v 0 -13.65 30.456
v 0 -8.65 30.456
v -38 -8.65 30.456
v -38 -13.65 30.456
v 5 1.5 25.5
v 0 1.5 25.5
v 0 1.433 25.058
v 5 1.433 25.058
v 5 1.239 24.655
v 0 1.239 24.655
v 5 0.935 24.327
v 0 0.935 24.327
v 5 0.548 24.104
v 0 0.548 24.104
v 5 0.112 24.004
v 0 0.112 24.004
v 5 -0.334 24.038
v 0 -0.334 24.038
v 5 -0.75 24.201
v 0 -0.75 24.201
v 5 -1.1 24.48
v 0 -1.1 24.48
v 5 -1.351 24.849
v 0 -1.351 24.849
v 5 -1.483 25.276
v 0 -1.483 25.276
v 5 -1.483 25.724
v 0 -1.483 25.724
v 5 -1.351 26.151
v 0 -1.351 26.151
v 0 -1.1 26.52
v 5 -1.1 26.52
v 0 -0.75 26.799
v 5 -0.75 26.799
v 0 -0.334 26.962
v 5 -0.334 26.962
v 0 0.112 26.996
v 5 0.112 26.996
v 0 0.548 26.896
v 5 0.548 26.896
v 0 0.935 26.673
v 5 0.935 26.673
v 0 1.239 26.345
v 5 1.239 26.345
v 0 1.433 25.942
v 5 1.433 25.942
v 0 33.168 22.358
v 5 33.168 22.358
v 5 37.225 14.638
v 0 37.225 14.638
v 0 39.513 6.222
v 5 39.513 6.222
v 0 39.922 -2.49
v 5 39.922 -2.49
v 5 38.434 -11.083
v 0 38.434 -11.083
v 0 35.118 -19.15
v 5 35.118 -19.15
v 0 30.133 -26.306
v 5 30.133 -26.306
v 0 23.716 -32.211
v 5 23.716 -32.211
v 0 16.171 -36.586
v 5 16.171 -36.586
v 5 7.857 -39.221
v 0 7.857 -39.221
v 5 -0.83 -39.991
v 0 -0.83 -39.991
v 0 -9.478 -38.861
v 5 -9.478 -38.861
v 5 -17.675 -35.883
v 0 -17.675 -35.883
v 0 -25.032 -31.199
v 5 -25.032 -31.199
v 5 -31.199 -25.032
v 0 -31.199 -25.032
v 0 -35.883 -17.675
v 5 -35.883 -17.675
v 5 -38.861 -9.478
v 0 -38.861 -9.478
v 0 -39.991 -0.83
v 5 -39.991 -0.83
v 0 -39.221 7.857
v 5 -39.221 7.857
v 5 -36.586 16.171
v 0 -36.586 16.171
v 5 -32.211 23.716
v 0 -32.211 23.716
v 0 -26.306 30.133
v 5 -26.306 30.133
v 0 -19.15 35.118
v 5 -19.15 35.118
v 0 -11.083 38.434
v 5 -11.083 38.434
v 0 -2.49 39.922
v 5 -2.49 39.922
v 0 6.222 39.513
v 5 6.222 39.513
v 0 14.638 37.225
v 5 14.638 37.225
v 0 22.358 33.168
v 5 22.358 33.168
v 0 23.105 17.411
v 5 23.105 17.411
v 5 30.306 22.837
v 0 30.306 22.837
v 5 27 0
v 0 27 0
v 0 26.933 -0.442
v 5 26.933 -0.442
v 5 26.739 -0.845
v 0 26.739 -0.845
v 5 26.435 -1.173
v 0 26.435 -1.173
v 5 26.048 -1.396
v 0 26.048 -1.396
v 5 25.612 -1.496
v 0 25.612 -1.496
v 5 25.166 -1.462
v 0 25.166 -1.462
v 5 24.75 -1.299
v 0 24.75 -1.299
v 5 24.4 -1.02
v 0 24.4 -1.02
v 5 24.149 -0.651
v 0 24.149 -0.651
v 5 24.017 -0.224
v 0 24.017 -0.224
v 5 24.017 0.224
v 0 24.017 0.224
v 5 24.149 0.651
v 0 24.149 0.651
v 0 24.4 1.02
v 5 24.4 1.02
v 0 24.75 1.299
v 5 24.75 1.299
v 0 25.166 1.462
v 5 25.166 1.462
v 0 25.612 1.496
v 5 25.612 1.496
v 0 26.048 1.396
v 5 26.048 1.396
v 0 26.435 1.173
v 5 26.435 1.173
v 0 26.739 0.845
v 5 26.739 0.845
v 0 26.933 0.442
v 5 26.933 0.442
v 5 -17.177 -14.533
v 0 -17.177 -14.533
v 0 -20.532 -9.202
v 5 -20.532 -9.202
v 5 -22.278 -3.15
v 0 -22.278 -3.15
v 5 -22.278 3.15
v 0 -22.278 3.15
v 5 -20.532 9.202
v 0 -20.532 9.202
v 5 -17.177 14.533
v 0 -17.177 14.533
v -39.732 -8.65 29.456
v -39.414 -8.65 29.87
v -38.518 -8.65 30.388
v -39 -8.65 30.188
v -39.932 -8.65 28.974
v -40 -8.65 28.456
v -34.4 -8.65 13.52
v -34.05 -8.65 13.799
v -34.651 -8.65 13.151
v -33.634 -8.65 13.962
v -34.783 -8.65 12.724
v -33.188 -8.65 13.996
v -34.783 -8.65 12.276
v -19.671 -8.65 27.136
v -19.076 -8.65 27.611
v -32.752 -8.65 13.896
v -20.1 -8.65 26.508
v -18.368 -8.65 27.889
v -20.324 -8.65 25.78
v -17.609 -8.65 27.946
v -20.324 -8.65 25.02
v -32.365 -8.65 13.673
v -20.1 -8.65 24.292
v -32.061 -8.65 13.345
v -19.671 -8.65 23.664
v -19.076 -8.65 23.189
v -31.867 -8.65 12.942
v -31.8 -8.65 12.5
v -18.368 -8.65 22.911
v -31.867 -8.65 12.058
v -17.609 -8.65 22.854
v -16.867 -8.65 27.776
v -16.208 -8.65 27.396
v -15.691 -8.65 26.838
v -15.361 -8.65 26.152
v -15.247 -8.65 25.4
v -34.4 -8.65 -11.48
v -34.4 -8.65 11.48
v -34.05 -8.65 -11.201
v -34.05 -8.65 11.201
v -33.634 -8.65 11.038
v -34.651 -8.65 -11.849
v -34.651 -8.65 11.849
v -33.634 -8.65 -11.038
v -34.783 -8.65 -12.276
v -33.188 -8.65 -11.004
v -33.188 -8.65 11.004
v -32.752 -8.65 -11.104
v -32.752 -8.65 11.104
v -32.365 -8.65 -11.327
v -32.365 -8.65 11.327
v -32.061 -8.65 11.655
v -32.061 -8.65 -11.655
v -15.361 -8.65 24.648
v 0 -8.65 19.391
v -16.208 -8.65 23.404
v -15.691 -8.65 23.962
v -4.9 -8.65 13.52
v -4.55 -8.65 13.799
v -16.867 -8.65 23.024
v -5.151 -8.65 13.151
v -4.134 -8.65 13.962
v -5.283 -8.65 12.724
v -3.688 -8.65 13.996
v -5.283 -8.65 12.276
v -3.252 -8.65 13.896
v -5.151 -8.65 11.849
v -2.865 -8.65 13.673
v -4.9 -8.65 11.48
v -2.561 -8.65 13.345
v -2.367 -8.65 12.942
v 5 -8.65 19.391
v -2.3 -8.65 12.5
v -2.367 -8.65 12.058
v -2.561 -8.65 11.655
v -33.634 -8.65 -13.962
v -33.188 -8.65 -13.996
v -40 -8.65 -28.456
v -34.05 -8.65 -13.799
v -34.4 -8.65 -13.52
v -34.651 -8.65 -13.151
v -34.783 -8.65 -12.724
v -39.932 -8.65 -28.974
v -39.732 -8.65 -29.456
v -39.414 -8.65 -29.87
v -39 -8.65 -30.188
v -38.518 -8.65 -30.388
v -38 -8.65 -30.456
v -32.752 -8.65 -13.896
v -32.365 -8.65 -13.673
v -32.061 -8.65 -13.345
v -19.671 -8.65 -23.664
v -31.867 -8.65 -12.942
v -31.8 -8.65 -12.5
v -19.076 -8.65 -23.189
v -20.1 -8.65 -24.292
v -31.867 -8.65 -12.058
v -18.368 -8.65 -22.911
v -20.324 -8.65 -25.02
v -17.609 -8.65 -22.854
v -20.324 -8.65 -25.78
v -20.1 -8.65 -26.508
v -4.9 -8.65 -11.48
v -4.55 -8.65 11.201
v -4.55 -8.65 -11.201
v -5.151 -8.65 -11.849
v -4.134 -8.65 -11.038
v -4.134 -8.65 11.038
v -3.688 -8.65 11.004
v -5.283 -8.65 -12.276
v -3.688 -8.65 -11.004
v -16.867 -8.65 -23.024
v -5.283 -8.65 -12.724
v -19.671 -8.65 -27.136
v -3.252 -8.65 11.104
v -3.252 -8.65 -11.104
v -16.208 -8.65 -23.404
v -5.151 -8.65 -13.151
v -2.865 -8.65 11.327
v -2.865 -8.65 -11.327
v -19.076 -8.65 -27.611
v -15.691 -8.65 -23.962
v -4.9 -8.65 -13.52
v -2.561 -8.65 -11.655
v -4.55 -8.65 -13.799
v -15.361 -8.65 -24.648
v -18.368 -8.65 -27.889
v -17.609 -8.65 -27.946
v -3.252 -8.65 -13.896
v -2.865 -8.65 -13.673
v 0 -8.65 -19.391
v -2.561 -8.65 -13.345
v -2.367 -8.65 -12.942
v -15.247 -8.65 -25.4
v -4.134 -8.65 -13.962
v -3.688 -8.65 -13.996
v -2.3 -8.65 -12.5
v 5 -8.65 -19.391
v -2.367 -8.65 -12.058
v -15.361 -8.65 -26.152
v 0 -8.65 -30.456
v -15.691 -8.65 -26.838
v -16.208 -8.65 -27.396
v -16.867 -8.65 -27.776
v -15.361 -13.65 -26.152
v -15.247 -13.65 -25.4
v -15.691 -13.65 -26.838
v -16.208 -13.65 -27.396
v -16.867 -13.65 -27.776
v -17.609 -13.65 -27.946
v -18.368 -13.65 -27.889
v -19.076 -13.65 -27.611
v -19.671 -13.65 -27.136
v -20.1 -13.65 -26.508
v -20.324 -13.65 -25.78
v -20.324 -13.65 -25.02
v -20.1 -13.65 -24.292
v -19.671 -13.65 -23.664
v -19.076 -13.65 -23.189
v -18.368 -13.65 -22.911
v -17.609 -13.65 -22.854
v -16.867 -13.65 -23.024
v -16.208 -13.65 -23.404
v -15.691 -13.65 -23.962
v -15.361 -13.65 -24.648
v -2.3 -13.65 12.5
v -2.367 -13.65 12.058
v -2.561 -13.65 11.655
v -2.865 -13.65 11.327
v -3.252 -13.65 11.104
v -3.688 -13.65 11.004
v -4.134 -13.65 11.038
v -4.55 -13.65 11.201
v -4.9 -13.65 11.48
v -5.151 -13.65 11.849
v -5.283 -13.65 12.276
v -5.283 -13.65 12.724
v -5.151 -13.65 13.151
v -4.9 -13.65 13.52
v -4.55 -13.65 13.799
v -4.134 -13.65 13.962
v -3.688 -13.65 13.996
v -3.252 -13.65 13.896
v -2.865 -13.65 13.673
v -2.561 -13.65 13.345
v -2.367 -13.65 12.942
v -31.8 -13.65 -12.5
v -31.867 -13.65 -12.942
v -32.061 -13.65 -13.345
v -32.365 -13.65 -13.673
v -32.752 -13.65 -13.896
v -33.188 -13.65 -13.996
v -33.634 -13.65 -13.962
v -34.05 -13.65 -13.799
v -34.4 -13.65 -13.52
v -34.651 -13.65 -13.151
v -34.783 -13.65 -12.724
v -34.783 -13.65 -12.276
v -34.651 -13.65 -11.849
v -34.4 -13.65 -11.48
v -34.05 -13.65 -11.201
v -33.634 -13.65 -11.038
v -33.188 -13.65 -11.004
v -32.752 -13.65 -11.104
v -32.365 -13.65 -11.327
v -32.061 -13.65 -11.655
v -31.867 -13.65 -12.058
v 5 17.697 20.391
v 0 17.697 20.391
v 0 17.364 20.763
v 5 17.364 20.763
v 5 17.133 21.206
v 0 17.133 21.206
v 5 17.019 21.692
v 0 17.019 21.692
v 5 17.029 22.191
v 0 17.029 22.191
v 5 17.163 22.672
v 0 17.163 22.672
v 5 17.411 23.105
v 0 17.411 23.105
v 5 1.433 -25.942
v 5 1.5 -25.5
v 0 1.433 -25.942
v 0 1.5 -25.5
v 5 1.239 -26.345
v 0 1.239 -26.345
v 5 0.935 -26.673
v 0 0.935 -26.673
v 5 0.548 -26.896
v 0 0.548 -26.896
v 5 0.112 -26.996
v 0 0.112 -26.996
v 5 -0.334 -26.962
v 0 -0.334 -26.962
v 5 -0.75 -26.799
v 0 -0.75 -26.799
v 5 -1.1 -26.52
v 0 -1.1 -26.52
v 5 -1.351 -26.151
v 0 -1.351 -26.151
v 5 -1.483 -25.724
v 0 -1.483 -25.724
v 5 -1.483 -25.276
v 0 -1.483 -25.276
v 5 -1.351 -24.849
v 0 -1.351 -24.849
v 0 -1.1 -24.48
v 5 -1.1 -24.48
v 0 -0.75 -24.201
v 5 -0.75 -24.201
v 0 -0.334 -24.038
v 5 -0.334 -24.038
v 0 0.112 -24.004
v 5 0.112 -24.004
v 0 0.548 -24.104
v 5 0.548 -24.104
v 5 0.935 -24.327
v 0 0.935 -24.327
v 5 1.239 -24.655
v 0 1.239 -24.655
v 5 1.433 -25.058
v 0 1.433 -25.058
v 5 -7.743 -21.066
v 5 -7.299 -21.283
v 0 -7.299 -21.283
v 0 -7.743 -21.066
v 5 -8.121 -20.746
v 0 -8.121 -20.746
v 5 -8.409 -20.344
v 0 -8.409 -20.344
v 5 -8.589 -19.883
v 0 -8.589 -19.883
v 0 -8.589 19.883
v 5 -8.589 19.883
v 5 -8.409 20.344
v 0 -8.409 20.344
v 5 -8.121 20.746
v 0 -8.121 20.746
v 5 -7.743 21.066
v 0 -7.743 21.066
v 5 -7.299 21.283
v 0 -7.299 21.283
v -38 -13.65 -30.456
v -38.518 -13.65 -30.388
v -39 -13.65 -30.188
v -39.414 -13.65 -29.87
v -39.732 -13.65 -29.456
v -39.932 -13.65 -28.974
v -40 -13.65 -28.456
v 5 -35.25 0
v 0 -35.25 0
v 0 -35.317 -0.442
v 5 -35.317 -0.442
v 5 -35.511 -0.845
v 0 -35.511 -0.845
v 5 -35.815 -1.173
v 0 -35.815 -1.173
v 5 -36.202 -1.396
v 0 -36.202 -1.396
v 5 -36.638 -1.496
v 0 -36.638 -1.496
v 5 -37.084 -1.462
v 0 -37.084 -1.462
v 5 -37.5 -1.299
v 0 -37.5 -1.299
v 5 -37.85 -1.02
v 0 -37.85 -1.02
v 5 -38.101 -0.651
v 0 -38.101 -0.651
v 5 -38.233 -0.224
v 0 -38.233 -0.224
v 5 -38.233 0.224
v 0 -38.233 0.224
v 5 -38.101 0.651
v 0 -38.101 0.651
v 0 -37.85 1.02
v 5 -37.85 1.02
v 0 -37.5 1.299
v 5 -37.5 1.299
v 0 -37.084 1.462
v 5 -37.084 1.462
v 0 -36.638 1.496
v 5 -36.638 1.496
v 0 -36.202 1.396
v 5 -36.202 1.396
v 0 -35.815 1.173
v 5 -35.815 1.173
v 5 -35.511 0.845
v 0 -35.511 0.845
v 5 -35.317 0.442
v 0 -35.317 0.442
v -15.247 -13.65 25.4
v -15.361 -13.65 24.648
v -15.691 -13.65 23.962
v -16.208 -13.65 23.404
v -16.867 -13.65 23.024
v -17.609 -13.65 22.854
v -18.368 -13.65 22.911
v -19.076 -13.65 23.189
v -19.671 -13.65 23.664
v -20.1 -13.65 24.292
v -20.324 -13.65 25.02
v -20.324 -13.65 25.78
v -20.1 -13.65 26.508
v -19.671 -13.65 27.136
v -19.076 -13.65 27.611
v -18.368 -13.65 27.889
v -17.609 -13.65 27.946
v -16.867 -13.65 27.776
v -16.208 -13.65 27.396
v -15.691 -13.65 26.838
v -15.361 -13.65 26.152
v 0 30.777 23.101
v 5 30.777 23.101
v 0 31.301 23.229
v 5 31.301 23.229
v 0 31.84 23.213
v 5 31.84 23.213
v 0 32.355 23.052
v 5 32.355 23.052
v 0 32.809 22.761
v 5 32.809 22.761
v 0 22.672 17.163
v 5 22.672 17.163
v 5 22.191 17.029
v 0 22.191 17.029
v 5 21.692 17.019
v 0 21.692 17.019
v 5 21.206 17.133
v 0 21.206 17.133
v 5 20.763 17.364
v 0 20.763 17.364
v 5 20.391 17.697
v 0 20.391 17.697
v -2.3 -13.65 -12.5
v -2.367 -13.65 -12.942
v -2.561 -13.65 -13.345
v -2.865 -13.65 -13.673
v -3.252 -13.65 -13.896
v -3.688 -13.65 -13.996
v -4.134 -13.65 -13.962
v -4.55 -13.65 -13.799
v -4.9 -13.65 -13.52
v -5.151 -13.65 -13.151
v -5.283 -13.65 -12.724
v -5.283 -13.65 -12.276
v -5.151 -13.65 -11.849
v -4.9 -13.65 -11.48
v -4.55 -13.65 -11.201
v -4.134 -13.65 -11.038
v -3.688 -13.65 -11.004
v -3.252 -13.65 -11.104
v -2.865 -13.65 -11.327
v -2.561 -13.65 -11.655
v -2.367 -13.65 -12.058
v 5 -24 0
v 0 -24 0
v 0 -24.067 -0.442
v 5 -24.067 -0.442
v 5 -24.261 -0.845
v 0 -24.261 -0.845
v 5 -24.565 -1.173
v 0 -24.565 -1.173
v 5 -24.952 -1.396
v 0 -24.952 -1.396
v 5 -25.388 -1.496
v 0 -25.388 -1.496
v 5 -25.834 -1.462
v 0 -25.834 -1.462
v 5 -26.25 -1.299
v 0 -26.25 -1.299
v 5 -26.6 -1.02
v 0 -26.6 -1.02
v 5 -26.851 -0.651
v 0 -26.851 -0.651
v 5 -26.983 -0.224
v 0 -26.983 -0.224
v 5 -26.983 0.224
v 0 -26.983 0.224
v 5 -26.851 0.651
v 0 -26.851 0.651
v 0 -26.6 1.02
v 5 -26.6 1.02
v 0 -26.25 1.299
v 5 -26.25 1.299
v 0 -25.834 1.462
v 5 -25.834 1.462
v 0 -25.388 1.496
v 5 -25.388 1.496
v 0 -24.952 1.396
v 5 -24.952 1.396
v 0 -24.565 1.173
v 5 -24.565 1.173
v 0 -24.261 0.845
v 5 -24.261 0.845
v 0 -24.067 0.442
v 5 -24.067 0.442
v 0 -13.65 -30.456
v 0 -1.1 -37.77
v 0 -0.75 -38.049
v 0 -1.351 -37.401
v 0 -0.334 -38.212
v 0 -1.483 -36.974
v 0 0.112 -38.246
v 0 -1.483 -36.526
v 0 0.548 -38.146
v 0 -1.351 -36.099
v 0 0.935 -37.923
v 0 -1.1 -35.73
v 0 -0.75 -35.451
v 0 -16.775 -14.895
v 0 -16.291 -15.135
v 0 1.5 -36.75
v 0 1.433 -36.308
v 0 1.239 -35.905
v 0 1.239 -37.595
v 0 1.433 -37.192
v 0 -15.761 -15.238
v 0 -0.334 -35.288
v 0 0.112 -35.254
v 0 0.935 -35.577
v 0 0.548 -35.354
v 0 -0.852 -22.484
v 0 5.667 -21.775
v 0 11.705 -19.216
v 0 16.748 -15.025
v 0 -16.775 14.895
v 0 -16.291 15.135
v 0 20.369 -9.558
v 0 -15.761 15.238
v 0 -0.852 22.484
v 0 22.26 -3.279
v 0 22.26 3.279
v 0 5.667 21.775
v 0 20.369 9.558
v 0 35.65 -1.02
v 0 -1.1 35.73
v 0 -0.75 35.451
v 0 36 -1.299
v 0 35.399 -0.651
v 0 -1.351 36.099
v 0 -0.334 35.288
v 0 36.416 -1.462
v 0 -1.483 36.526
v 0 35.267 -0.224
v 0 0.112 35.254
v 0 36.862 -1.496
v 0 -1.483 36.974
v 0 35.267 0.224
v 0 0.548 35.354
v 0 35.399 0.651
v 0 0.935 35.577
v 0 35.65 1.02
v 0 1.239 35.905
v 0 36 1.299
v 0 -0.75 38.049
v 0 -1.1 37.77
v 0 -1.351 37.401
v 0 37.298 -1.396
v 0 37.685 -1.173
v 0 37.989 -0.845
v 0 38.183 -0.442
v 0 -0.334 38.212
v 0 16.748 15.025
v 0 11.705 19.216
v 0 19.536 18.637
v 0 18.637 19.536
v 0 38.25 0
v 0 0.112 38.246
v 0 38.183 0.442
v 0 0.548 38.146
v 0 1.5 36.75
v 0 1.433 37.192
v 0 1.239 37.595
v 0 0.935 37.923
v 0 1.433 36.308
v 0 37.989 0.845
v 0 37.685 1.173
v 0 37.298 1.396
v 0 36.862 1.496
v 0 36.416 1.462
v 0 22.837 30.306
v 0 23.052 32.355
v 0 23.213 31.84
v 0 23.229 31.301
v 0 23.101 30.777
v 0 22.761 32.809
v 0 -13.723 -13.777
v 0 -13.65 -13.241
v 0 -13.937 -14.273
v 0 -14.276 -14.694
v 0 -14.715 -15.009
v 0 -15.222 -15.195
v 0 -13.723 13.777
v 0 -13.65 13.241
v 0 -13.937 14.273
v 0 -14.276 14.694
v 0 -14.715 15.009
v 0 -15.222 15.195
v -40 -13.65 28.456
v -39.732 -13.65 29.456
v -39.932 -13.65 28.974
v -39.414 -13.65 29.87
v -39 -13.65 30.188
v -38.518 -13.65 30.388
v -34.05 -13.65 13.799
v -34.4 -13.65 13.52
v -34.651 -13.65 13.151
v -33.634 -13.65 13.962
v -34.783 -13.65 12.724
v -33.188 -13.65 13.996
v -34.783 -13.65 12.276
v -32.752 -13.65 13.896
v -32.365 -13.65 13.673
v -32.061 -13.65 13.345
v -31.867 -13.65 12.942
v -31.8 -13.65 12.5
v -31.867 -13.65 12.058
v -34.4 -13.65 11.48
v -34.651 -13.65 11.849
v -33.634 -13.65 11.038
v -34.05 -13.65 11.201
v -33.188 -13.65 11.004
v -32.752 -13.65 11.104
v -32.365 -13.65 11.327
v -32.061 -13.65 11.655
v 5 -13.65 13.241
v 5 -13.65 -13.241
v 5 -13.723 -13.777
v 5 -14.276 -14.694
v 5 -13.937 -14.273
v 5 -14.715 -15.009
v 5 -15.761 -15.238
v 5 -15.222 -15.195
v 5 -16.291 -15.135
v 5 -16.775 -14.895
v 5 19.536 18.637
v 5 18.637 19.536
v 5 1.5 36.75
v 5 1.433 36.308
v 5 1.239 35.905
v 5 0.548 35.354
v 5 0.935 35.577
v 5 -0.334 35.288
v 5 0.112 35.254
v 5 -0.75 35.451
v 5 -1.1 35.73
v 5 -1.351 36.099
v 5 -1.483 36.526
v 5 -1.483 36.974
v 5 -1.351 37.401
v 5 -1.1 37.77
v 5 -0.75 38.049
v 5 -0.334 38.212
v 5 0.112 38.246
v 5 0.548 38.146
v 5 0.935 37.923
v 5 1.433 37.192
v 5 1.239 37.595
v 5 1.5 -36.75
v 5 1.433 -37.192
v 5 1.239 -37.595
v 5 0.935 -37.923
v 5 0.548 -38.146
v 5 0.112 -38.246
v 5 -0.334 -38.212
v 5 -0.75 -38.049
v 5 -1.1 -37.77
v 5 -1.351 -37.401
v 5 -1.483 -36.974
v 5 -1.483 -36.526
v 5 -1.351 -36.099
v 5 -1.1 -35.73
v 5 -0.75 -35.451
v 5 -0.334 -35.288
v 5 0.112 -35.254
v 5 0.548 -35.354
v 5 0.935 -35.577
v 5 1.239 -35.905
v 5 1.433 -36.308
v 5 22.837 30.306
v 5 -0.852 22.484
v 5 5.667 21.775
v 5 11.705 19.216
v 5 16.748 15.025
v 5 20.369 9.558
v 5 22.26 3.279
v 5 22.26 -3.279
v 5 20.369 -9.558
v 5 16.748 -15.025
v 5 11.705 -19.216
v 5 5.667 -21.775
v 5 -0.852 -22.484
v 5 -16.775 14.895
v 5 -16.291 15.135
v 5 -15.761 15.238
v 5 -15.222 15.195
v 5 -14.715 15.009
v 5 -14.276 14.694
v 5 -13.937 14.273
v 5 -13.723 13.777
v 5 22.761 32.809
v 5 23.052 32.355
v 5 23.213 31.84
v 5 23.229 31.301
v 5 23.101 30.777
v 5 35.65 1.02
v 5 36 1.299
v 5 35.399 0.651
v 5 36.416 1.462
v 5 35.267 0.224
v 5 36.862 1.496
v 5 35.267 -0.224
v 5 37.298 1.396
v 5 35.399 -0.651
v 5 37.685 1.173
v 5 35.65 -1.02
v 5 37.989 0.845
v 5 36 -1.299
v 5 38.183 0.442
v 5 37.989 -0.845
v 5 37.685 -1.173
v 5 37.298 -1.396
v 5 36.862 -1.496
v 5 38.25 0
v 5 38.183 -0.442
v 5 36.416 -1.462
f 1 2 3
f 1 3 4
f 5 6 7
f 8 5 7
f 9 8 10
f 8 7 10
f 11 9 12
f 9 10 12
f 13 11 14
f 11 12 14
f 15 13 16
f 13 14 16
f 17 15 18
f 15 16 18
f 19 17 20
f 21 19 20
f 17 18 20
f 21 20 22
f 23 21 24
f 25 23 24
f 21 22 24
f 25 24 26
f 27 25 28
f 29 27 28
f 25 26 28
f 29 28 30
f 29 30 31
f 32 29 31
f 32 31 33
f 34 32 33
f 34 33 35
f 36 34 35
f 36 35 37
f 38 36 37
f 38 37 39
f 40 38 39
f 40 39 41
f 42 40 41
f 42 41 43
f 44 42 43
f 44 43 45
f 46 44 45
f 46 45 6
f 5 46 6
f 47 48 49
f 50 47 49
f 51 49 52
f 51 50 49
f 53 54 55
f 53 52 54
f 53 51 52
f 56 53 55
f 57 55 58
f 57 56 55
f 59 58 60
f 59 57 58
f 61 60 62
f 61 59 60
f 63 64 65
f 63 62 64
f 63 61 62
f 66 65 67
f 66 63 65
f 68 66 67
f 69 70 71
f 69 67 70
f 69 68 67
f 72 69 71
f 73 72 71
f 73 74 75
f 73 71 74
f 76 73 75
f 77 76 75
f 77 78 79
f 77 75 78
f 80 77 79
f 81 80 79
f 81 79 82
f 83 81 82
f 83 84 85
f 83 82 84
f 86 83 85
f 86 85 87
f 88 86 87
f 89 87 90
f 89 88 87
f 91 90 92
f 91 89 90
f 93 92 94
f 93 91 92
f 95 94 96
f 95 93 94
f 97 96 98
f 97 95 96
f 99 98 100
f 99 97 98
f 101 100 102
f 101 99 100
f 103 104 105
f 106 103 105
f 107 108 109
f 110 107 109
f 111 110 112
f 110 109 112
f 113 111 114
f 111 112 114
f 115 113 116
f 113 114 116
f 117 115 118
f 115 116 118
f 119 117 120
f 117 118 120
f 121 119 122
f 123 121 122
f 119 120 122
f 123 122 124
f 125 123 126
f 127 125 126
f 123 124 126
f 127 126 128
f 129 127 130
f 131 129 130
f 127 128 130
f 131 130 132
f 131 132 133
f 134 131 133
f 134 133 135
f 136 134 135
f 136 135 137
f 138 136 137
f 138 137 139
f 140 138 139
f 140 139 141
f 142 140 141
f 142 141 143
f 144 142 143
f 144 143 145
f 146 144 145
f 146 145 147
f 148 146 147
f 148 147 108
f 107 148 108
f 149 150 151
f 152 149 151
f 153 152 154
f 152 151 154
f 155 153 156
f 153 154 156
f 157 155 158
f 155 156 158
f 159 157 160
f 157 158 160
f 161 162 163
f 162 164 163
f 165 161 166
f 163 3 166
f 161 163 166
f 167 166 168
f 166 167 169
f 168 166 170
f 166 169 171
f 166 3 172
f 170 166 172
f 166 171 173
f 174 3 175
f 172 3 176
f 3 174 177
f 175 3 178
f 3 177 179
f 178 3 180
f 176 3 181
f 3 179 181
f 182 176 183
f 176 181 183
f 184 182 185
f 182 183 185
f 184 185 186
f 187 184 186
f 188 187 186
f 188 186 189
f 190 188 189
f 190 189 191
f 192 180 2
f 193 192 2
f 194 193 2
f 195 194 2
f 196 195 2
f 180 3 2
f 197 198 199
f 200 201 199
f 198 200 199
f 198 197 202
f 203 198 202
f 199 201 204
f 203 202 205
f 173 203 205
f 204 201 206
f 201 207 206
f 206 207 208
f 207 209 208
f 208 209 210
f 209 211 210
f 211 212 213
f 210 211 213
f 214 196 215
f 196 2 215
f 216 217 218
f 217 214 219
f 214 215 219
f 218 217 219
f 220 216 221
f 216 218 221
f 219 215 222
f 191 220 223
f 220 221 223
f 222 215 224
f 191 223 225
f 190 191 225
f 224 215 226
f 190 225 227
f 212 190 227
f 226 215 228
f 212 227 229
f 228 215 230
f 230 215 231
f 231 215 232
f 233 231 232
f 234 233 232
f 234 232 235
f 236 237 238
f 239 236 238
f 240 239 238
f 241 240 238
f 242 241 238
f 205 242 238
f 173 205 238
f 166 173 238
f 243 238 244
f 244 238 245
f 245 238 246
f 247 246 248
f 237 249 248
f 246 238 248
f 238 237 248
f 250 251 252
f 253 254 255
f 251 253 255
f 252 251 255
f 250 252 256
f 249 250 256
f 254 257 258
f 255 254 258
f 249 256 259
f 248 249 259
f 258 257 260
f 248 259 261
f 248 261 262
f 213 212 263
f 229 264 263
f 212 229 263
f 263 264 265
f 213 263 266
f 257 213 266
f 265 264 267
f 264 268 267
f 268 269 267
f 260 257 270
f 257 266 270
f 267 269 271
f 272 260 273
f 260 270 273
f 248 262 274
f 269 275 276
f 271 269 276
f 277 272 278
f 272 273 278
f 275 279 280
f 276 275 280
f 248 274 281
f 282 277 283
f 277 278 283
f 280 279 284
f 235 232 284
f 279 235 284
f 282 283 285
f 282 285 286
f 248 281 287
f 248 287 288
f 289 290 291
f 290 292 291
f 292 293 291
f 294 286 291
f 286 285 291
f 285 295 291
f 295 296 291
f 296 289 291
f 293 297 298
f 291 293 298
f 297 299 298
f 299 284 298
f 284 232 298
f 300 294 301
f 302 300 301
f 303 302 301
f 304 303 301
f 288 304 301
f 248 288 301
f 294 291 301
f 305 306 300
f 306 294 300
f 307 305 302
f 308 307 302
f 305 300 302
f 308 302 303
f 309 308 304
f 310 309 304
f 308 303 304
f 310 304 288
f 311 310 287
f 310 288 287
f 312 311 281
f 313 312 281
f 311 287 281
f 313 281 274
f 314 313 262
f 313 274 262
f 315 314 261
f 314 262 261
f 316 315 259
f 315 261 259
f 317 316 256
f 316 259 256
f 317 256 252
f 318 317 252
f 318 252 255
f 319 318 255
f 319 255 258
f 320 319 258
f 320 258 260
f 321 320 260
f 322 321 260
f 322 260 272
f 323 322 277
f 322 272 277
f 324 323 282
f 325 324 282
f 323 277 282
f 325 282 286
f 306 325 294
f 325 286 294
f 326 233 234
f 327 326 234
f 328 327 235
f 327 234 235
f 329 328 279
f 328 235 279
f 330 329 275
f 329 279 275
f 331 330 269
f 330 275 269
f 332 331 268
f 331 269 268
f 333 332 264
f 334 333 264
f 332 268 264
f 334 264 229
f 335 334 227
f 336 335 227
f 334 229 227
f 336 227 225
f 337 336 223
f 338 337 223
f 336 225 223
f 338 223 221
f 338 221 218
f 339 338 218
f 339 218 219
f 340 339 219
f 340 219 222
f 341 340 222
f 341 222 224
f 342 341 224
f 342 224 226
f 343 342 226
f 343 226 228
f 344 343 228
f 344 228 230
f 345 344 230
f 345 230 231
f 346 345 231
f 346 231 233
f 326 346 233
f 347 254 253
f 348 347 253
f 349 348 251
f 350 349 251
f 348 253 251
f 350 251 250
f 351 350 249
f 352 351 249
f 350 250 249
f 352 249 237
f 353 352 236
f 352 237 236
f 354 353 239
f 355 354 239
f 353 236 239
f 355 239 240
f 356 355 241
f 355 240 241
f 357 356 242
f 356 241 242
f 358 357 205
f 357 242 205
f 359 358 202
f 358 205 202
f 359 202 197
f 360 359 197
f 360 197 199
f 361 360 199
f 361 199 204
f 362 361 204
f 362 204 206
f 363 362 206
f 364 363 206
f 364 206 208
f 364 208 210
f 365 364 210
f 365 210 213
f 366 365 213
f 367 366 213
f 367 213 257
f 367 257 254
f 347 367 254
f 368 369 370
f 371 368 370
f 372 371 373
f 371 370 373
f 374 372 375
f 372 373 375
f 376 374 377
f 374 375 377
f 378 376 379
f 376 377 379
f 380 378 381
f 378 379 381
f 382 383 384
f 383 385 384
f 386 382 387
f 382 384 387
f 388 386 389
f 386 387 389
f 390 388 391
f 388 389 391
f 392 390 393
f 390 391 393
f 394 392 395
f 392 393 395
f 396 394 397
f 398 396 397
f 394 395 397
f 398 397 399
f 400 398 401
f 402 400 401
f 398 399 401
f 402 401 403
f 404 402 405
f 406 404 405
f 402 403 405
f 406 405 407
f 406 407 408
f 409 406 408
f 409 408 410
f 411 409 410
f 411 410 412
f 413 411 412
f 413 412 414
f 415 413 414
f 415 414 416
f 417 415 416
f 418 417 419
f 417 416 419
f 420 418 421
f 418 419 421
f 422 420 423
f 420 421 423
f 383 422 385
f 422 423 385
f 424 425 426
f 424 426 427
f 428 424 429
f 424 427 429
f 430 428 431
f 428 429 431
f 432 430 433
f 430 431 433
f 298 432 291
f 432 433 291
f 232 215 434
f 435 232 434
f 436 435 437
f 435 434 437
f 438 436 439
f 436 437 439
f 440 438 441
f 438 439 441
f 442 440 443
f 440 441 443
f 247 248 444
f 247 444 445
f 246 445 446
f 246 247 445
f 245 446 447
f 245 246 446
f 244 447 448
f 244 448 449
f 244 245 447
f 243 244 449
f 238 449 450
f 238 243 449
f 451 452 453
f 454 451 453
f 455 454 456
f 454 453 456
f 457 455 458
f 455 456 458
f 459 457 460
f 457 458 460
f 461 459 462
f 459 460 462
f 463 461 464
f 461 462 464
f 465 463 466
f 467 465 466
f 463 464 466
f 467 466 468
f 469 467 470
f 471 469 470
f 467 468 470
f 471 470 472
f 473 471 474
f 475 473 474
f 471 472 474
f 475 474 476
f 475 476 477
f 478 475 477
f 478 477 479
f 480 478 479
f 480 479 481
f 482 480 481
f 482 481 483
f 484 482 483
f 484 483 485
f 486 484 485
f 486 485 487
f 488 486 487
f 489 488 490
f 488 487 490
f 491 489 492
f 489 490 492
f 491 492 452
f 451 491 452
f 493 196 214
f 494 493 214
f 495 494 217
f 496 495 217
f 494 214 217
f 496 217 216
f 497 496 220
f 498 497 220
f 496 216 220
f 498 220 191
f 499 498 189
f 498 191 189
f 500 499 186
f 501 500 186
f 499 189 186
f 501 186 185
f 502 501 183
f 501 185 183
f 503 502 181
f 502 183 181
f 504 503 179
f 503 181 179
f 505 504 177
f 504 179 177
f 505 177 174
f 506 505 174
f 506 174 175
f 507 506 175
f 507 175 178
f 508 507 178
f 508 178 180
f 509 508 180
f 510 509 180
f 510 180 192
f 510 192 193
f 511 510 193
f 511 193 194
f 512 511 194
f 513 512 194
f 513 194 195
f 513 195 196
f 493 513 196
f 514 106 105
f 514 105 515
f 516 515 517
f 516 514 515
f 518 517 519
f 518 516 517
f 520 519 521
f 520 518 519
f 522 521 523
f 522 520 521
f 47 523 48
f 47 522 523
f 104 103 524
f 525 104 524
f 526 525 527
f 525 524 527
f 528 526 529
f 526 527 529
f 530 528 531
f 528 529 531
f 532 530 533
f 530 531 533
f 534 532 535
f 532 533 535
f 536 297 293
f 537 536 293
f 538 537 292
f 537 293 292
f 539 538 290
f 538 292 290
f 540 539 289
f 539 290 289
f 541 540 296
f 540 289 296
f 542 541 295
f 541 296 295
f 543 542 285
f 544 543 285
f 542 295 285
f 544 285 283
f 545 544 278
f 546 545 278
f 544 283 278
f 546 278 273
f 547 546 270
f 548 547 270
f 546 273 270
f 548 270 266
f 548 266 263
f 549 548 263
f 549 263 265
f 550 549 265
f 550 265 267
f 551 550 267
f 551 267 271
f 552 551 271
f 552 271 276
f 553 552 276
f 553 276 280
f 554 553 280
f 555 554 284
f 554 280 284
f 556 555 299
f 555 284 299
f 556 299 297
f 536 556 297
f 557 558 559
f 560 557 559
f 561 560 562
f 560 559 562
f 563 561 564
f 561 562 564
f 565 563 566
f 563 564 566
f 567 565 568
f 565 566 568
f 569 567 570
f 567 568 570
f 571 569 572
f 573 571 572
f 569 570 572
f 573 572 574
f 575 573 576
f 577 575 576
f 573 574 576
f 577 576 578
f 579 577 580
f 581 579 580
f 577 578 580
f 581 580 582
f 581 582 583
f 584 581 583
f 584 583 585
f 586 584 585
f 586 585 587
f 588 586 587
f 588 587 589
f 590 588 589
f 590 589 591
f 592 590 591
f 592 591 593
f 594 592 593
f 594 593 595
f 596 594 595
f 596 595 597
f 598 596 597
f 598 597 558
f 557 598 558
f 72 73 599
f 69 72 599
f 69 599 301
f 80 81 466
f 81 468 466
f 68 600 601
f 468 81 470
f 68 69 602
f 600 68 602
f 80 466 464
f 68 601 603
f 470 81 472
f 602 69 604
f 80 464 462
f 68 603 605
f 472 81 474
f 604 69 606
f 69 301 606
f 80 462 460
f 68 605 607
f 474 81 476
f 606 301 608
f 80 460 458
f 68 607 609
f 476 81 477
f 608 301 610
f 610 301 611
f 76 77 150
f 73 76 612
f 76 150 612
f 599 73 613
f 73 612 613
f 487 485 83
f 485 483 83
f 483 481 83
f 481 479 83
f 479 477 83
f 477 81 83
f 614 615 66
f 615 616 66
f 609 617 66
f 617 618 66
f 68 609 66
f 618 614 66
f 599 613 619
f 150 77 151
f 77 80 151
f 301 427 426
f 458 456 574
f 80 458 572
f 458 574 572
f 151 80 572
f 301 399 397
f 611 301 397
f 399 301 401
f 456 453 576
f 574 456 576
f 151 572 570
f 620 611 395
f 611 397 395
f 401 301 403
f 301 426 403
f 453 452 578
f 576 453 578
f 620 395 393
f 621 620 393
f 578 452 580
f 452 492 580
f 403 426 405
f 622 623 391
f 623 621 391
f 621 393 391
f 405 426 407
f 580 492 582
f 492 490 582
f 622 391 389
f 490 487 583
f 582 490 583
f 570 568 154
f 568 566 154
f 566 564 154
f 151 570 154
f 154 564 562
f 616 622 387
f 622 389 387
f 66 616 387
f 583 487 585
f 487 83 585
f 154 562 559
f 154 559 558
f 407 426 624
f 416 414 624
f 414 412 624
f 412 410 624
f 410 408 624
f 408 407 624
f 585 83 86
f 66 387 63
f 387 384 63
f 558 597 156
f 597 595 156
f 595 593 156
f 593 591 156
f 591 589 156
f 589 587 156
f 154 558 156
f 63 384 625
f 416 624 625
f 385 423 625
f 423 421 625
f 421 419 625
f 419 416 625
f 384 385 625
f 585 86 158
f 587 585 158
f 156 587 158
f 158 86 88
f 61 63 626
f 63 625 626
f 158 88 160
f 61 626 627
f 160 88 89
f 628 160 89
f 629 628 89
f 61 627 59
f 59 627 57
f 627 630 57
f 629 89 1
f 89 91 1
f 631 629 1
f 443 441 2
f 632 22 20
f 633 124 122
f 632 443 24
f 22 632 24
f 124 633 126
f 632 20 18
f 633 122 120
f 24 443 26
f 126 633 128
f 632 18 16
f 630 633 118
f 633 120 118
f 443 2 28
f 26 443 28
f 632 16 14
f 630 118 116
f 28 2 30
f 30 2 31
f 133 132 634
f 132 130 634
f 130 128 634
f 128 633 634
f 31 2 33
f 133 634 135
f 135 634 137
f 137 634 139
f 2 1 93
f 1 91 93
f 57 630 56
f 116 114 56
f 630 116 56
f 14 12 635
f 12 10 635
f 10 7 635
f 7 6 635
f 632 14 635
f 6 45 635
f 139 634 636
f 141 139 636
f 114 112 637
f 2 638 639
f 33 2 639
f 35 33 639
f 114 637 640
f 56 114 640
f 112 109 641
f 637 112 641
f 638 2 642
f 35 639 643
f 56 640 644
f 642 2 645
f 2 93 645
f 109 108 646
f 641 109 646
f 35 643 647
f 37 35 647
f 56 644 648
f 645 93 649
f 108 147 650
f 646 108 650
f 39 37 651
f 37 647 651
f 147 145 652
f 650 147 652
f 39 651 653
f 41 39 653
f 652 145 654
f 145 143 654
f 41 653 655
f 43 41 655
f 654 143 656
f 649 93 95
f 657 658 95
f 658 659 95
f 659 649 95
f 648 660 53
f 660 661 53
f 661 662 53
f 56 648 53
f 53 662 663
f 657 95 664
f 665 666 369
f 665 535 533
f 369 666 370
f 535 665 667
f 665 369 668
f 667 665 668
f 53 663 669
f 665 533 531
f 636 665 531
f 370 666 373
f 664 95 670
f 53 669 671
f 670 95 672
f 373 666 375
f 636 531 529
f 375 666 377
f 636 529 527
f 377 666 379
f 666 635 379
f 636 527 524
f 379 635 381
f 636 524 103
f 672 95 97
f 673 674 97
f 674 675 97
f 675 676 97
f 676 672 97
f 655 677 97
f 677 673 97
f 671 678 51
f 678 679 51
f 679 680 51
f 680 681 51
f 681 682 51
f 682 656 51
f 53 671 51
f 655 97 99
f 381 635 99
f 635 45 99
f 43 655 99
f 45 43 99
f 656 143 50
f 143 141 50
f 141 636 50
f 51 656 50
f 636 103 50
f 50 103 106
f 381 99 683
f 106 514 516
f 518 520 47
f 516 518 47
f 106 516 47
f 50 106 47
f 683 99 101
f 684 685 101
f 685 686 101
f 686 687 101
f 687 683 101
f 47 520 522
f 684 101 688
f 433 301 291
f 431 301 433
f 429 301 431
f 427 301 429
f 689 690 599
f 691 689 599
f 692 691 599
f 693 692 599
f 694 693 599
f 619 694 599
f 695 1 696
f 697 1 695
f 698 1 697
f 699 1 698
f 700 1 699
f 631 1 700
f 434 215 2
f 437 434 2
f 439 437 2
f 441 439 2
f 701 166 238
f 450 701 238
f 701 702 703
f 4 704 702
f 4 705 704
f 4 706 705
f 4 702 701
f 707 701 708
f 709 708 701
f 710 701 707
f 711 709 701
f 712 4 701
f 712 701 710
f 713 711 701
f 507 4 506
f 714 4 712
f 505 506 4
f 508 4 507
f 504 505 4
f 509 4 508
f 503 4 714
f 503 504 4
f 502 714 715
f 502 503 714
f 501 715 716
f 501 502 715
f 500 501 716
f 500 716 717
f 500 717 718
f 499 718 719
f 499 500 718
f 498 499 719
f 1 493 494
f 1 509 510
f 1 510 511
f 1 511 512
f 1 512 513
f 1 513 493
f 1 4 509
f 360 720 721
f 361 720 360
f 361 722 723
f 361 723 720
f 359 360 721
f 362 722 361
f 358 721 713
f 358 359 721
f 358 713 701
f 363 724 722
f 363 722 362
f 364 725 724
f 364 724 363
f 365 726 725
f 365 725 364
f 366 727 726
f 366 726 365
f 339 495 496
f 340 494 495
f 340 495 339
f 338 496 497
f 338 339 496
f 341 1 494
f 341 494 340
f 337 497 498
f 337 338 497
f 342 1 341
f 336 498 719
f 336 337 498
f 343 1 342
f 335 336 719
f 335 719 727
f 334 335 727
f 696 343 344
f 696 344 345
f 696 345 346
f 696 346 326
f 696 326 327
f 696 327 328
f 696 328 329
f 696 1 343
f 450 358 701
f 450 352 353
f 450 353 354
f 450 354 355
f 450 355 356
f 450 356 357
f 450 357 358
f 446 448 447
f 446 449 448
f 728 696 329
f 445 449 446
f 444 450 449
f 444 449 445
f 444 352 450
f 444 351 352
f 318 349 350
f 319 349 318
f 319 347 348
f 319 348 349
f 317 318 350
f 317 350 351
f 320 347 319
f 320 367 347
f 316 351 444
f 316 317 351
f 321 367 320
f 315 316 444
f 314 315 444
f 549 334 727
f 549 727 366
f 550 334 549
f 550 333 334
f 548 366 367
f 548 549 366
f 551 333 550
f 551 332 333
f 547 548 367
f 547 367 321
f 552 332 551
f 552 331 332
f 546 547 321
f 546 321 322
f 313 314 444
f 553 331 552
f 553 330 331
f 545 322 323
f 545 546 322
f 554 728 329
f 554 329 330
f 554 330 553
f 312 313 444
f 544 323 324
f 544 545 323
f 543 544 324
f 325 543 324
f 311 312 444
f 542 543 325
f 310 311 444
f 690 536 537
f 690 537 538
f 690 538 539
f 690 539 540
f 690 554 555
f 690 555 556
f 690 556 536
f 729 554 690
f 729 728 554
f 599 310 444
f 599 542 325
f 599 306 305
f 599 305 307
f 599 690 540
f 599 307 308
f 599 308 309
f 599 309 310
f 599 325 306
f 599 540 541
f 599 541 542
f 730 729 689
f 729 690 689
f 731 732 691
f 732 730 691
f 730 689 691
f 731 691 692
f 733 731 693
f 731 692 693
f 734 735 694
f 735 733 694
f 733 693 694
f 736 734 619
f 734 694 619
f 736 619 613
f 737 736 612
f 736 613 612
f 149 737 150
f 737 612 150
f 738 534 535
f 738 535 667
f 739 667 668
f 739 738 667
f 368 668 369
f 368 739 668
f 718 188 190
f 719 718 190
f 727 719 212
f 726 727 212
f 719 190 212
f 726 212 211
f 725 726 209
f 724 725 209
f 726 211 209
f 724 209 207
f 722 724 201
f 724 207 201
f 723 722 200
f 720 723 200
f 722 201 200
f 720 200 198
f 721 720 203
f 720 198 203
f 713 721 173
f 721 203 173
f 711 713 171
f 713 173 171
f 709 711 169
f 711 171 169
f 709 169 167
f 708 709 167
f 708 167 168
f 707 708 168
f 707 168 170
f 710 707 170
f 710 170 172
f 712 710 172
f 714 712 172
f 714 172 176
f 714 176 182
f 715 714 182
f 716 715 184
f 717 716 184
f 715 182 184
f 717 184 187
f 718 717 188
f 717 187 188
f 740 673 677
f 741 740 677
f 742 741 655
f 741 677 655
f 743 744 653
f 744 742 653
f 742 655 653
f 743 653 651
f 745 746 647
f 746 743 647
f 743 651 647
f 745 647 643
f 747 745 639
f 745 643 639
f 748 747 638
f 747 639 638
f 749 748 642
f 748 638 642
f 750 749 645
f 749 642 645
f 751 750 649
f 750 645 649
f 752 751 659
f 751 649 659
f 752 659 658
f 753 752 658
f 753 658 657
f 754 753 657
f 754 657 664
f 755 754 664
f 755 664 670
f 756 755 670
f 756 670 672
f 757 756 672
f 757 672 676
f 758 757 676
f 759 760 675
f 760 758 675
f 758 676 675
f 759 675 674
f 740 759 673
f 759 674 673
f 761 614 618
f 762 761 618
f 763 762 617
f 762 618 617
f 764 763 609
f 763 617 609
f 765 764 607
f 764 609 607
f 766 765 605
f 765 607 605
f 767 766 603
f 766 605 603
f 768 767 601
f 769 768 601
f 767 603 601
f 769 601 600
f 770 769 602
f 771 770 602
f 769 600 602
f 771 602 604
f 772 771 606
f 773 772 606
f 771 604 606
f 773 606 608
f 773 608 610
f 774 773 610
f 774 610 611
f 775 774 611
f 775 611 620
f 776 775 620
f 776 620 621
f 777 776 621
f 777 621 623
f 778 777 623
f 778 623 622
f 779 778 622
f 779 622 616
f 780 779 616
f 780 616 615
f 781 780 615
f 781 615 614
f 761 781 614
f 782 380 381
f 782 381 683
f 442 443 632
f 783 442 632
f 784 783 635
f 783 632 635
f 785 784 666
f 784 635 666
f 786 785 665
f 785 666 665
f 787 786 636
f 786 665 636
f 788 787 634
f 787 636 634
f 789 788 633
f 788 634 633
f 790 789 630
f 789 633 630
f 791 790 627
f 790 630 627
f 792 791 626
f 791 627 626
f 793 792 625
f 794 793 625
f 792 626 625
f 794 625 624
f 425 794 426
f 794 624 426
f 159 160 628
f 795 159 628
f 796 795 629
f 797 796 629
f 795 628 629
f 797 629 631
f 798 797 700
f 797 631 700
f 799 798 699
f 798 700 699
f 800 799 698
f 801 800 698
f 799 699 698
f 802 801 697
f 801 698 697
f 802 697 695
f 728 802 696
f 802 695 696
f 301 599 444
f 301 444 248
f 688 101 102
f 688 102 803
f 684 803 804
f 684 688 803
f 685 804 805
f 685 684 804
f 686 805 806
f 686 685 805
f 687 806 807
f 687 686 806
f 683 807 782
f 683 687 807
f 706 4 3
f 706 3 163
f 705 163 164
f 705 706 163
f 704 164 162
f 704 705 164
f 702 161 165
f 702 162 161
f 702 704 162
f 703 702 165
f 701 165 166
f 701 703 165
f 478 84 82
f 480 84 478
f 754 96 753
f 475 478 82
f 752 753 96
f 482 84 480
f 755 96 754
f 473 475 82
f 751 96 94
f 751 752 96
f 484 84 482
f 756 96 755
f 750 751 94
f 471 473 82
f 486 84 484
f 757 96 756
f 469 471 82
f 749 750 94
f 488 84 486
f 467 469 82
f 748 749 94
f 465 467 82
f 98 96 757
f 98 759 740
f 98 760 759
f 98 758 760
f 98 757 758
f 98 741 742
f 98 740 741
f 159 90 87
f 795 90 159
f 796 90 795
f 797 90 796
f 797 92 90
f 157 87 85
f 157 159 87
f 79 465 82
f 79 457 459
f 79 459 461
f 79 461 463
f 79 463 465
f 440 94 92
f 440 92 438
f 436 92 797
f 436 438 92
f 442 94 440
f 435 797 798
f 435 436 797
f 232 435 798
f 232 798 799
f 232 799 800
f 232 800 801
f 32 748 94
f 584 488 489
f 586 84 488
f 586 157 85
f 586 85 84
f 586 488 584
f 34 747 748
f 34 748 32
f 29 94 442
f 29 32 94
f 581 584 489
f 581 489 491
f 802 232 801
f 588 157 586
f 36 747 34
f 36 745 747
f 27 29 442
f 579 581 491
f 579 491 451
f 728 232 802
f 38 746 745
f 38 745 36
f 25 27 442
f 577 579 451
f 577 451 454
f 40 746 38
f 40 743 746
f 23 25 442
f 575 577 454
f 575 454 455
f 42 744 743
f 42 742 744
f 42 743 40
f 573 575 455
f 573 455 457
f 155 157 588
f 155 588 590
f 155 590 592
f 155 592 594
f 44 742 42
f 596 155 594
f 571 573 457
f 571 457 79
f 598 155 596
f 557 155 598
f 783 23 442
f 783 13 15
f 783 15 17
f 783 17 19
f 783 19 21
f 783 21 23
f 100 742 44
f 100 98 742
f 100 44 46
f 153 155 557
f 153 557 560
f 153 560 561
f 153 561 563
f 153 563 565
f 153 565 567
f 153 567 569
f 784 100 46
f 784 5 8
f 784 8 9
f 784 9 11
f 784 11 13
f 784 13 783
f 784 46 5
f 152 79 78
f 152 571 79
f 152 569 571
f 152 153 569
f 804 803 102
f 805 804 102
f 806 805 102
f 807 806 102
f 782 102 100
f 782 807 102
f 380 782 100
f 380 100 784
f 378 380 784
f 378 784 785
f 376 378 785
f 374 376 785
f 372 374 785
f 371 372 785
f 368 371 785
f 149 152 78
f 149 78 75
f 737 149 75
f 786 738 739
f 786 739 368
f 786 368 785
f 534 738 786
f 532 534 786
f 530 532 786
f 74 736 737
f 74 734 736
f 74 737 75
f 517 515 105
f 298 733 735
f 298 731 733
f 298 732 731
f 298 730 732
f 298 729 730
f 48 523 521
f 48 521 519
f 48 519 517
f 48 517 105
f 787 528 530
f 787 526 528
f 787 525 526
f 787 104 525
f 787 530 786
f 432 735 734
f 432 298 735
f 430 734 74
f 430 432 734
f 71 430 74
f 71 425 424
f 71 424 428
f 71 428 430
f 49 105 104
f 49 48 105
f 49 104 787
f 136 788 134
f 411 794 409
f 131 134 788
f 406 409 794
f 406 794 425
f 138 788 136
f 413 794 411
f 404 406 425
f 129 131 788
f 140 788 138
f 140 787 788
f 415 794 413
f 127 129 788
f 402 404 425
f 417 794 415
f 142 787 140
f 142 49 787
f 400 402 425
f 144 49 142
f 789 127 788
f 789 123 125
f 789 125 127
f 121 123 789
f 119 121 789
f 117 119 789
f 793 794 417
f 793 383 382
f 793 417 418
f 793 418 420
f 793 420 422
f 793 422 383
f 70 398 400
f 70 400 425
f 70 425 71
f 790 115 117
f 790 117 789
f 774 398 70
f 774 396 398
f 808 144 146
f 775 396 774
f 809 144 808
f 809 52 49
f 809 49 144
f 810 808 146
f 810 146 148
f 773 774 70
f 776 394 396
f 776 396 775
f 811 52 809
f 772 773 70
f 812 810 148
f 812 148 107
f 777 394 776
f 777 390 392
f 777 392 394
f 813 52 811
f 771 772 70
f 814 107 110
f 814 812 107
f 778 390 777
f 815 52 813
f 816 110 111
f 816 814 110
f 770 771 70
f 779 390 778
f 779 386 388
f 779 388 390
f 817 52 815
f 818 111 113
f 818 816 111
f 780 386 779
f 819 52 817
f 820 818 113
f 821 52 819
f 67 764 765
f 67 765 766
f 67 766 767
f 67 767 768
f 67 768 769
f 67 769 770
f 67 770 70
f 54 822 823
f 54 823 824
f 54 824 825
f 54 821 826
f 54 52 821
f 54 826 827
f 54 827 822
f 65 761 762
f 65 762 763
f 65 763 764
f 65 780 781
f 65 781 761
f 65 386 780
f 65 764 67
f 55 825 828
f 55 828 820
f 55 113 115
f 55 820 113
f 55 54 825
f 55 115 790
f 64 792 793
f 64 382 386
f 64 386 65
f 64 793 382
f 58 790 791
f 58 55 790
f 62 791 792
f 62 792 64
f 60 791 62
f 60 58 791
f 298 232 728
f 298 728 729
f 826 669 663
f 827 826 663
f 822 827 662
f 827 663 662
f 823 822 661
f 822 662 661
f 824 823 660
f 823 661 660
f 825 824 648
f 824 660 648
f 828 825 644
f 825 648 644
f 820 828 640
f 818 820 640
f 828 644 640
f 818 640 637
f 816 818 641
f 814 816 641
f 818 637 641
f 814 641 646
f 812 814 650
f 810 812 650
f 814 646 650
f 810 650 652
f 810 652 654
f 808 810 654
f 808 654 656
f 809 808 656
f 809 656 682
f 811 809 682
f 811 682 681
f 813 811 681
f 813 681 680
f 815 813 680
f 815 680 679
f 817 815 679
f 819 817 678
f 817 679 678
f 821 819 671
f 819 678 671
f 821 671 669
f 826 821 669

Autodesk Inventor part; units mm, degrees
ref_plane "YZ Plane" through (0, 0, 0) normal (1, 0, 0) x (0, 1, 0)
sketch "Sketch1" plane through (0, 0, 0) normal (1, 0, 0) x (0, 1, 0)
  circle A0 centre (0, 0) radius 22.5
  circle A1 centre (0, 0) radius 40
  circle A2 centre (0, 36.75) radius 1.5
  circle A3 centre (0, 25.5) radius 1.5
  line L0 (0, 22.5) -> (0, 25.5)
  circle A4 centre (-36.75, 0) radius 1.5
  circle A5 centre (-25.5, 0) radius 1.5
  circle A6 centre (0, -36.75) radius 1.5
  circle A7 centre (0, -25.5) radius 1.5
  circle A8 centre (36.75, 0) radius 1.5
  circle A9 centre (25.5, 0) radius 1.5
  dimension "d0" = 45
  dimension "d9" = 80
  dimension "d12" = 3
  dimension "d13" = 3
  dimension "d64" = 3
  dimension "d67" = 360
ref_plane "Work Plane1" through (5, 0, 0) normal (1, 0, 0) x (0, 0, -1)
sketch "Sketch2" plane through (5, 0, 0) normal (1, 0, 0) x (0, 0, -1)
  line L0 (0, 0) -> (0, -8.65)
  line L1 (0, -8.65) -> (23.4559, -8.65)
  line L2 (0, -8.65) -> (-23.4559, -8.65)
  line L3 (-23.4559, -8.65) -> (-30.4559, -8.65)
  line L4 (23.4559, -8.65) -> (30.4559, -8.65)
  line L5 (-30.4559, -8.65) -> (-30.4559, -13.65)
  line L6 (-30.4559, -13.65) -> (30.4559, -13.65)
  line L7 (30.4559, -13.65) -> (30.4559, -8.65)
  circle A0 centre (0, 0) radius 22.5
  dimension "d20" = 8.65
  dimension "d21" = 7
  dimension "d22" = 7
  dimension "d23" = 5
  dimension "d50" = 45
extrude "Extrusion2" add sketch "Sketch2" against normal blind 45 contours L1 A0 L6 L2 | L1 L4 L7 L6 A0 | A0 L6 L5 L3 L2
ref_plane "Work Plane2" through (5, -8.65, 23.4559) normal (0, 1, 0) x (1, 0, 0)
sketch "Sketch3" plane through (5, -8.65, 23.4559) normal (0, 1, 0) x (1, 0, 0)
  line L0 (-5, 23.4559) -> (-8.8, 23.4559)
  circle A0 centre (-8.8, 35.9559) radius 1.5
  circle A1 centre (-38.3, 35.9559) radius 1.5
  line L1 (-45, 53.9117) -> (-45, -7) projected
  circle A2 centre (-22.8, -1.9441) radius 2.5527
  circle A3 centre (-22.8, 48.8559) radius 2.5527
  line L2 (-8.8, 35.9559) -> (-38.3, 35.9559)
  line L3 (-8.8, 23.4559) -> (-8.8, 35.9559)
  line L4 (-8.8, 35.9559) -> (-8.8, 23.4559)
  circle A4 centre (-8.8, 10.9559) radius 1.5
  circle A5 centre (-38.3, 10.9559) radius 1.5
  line L5 (-8.8, 10.9559) -> (-38.3, 10.9559)
  line L6 (-8.8, 23.4559) -> (-8.8, 10.9559)
  dimension "d26" = 3.8
  dimension "d31" = 3
  dimension "d32" = 3
  dimension "d39" = 5.1054
  dimension "d40" = 5.1054
  dimension "d57" = 29.5
  dimension "d61" = 12.5
extrude "Extrusion3" cut sketch "Sketch3" against normal blind 50
extrude "Extrusion4" add sketch "Sketch1" along normal blind 5 contours A1 | A4 | A5 | A6 | A7 | A8 | A9
sketch "Sketch4" plane through (5, 0, 0) normal (1, 0, 0) x (0, 0, -1)
  circle A0 centre (0, 0) radius 40
  circle A1 centre (0, 0) radius 27
  line L0 (0, 0) -> (-31.9454, 24.0726)
  line L1 (-35, 0) -> (0, 0)
  line L2 (0, 0) -> (0, 35)
  line L3 (0, 0) -> (-24.0726, 31.9454)
  arc A2 (-16.249, 21.5632) -> (-21.5632, 16.249) centre (0, 0) ccw
  dimension "d51" = 54
  dimension "d53" = 37
  dimension "d54" = 37
extrude "Extrusion5" cut sketch "Sketch4" against normal blind 24.5 contours L3 A1 L0 A0 picked at (-25.4889, 24.8968)
fillet "Fillet1" radius 2 10 edges at (2.5, 31.9454, 24.0726) (2.5, 24.0726, 31.9454) (2.5, 16.249, 21.5632) (2.5, 21.5632, 16.249) (-40, -11.15, 30.4559) (-40, -11.15, -30.4559) (2.5, -8.65, -20.7708) (2.5, -8.65, 20.7708) (2.5, -13.65, 17.8865) (2.5, -13.65, -17.8865)
extrude "Extrusion6" cut sketch "Sketch1" along normal blind 24.5 contours A4 | A5 | A6 | A7 | A8 | A9
properties part number "JeVois Camera Mount"
